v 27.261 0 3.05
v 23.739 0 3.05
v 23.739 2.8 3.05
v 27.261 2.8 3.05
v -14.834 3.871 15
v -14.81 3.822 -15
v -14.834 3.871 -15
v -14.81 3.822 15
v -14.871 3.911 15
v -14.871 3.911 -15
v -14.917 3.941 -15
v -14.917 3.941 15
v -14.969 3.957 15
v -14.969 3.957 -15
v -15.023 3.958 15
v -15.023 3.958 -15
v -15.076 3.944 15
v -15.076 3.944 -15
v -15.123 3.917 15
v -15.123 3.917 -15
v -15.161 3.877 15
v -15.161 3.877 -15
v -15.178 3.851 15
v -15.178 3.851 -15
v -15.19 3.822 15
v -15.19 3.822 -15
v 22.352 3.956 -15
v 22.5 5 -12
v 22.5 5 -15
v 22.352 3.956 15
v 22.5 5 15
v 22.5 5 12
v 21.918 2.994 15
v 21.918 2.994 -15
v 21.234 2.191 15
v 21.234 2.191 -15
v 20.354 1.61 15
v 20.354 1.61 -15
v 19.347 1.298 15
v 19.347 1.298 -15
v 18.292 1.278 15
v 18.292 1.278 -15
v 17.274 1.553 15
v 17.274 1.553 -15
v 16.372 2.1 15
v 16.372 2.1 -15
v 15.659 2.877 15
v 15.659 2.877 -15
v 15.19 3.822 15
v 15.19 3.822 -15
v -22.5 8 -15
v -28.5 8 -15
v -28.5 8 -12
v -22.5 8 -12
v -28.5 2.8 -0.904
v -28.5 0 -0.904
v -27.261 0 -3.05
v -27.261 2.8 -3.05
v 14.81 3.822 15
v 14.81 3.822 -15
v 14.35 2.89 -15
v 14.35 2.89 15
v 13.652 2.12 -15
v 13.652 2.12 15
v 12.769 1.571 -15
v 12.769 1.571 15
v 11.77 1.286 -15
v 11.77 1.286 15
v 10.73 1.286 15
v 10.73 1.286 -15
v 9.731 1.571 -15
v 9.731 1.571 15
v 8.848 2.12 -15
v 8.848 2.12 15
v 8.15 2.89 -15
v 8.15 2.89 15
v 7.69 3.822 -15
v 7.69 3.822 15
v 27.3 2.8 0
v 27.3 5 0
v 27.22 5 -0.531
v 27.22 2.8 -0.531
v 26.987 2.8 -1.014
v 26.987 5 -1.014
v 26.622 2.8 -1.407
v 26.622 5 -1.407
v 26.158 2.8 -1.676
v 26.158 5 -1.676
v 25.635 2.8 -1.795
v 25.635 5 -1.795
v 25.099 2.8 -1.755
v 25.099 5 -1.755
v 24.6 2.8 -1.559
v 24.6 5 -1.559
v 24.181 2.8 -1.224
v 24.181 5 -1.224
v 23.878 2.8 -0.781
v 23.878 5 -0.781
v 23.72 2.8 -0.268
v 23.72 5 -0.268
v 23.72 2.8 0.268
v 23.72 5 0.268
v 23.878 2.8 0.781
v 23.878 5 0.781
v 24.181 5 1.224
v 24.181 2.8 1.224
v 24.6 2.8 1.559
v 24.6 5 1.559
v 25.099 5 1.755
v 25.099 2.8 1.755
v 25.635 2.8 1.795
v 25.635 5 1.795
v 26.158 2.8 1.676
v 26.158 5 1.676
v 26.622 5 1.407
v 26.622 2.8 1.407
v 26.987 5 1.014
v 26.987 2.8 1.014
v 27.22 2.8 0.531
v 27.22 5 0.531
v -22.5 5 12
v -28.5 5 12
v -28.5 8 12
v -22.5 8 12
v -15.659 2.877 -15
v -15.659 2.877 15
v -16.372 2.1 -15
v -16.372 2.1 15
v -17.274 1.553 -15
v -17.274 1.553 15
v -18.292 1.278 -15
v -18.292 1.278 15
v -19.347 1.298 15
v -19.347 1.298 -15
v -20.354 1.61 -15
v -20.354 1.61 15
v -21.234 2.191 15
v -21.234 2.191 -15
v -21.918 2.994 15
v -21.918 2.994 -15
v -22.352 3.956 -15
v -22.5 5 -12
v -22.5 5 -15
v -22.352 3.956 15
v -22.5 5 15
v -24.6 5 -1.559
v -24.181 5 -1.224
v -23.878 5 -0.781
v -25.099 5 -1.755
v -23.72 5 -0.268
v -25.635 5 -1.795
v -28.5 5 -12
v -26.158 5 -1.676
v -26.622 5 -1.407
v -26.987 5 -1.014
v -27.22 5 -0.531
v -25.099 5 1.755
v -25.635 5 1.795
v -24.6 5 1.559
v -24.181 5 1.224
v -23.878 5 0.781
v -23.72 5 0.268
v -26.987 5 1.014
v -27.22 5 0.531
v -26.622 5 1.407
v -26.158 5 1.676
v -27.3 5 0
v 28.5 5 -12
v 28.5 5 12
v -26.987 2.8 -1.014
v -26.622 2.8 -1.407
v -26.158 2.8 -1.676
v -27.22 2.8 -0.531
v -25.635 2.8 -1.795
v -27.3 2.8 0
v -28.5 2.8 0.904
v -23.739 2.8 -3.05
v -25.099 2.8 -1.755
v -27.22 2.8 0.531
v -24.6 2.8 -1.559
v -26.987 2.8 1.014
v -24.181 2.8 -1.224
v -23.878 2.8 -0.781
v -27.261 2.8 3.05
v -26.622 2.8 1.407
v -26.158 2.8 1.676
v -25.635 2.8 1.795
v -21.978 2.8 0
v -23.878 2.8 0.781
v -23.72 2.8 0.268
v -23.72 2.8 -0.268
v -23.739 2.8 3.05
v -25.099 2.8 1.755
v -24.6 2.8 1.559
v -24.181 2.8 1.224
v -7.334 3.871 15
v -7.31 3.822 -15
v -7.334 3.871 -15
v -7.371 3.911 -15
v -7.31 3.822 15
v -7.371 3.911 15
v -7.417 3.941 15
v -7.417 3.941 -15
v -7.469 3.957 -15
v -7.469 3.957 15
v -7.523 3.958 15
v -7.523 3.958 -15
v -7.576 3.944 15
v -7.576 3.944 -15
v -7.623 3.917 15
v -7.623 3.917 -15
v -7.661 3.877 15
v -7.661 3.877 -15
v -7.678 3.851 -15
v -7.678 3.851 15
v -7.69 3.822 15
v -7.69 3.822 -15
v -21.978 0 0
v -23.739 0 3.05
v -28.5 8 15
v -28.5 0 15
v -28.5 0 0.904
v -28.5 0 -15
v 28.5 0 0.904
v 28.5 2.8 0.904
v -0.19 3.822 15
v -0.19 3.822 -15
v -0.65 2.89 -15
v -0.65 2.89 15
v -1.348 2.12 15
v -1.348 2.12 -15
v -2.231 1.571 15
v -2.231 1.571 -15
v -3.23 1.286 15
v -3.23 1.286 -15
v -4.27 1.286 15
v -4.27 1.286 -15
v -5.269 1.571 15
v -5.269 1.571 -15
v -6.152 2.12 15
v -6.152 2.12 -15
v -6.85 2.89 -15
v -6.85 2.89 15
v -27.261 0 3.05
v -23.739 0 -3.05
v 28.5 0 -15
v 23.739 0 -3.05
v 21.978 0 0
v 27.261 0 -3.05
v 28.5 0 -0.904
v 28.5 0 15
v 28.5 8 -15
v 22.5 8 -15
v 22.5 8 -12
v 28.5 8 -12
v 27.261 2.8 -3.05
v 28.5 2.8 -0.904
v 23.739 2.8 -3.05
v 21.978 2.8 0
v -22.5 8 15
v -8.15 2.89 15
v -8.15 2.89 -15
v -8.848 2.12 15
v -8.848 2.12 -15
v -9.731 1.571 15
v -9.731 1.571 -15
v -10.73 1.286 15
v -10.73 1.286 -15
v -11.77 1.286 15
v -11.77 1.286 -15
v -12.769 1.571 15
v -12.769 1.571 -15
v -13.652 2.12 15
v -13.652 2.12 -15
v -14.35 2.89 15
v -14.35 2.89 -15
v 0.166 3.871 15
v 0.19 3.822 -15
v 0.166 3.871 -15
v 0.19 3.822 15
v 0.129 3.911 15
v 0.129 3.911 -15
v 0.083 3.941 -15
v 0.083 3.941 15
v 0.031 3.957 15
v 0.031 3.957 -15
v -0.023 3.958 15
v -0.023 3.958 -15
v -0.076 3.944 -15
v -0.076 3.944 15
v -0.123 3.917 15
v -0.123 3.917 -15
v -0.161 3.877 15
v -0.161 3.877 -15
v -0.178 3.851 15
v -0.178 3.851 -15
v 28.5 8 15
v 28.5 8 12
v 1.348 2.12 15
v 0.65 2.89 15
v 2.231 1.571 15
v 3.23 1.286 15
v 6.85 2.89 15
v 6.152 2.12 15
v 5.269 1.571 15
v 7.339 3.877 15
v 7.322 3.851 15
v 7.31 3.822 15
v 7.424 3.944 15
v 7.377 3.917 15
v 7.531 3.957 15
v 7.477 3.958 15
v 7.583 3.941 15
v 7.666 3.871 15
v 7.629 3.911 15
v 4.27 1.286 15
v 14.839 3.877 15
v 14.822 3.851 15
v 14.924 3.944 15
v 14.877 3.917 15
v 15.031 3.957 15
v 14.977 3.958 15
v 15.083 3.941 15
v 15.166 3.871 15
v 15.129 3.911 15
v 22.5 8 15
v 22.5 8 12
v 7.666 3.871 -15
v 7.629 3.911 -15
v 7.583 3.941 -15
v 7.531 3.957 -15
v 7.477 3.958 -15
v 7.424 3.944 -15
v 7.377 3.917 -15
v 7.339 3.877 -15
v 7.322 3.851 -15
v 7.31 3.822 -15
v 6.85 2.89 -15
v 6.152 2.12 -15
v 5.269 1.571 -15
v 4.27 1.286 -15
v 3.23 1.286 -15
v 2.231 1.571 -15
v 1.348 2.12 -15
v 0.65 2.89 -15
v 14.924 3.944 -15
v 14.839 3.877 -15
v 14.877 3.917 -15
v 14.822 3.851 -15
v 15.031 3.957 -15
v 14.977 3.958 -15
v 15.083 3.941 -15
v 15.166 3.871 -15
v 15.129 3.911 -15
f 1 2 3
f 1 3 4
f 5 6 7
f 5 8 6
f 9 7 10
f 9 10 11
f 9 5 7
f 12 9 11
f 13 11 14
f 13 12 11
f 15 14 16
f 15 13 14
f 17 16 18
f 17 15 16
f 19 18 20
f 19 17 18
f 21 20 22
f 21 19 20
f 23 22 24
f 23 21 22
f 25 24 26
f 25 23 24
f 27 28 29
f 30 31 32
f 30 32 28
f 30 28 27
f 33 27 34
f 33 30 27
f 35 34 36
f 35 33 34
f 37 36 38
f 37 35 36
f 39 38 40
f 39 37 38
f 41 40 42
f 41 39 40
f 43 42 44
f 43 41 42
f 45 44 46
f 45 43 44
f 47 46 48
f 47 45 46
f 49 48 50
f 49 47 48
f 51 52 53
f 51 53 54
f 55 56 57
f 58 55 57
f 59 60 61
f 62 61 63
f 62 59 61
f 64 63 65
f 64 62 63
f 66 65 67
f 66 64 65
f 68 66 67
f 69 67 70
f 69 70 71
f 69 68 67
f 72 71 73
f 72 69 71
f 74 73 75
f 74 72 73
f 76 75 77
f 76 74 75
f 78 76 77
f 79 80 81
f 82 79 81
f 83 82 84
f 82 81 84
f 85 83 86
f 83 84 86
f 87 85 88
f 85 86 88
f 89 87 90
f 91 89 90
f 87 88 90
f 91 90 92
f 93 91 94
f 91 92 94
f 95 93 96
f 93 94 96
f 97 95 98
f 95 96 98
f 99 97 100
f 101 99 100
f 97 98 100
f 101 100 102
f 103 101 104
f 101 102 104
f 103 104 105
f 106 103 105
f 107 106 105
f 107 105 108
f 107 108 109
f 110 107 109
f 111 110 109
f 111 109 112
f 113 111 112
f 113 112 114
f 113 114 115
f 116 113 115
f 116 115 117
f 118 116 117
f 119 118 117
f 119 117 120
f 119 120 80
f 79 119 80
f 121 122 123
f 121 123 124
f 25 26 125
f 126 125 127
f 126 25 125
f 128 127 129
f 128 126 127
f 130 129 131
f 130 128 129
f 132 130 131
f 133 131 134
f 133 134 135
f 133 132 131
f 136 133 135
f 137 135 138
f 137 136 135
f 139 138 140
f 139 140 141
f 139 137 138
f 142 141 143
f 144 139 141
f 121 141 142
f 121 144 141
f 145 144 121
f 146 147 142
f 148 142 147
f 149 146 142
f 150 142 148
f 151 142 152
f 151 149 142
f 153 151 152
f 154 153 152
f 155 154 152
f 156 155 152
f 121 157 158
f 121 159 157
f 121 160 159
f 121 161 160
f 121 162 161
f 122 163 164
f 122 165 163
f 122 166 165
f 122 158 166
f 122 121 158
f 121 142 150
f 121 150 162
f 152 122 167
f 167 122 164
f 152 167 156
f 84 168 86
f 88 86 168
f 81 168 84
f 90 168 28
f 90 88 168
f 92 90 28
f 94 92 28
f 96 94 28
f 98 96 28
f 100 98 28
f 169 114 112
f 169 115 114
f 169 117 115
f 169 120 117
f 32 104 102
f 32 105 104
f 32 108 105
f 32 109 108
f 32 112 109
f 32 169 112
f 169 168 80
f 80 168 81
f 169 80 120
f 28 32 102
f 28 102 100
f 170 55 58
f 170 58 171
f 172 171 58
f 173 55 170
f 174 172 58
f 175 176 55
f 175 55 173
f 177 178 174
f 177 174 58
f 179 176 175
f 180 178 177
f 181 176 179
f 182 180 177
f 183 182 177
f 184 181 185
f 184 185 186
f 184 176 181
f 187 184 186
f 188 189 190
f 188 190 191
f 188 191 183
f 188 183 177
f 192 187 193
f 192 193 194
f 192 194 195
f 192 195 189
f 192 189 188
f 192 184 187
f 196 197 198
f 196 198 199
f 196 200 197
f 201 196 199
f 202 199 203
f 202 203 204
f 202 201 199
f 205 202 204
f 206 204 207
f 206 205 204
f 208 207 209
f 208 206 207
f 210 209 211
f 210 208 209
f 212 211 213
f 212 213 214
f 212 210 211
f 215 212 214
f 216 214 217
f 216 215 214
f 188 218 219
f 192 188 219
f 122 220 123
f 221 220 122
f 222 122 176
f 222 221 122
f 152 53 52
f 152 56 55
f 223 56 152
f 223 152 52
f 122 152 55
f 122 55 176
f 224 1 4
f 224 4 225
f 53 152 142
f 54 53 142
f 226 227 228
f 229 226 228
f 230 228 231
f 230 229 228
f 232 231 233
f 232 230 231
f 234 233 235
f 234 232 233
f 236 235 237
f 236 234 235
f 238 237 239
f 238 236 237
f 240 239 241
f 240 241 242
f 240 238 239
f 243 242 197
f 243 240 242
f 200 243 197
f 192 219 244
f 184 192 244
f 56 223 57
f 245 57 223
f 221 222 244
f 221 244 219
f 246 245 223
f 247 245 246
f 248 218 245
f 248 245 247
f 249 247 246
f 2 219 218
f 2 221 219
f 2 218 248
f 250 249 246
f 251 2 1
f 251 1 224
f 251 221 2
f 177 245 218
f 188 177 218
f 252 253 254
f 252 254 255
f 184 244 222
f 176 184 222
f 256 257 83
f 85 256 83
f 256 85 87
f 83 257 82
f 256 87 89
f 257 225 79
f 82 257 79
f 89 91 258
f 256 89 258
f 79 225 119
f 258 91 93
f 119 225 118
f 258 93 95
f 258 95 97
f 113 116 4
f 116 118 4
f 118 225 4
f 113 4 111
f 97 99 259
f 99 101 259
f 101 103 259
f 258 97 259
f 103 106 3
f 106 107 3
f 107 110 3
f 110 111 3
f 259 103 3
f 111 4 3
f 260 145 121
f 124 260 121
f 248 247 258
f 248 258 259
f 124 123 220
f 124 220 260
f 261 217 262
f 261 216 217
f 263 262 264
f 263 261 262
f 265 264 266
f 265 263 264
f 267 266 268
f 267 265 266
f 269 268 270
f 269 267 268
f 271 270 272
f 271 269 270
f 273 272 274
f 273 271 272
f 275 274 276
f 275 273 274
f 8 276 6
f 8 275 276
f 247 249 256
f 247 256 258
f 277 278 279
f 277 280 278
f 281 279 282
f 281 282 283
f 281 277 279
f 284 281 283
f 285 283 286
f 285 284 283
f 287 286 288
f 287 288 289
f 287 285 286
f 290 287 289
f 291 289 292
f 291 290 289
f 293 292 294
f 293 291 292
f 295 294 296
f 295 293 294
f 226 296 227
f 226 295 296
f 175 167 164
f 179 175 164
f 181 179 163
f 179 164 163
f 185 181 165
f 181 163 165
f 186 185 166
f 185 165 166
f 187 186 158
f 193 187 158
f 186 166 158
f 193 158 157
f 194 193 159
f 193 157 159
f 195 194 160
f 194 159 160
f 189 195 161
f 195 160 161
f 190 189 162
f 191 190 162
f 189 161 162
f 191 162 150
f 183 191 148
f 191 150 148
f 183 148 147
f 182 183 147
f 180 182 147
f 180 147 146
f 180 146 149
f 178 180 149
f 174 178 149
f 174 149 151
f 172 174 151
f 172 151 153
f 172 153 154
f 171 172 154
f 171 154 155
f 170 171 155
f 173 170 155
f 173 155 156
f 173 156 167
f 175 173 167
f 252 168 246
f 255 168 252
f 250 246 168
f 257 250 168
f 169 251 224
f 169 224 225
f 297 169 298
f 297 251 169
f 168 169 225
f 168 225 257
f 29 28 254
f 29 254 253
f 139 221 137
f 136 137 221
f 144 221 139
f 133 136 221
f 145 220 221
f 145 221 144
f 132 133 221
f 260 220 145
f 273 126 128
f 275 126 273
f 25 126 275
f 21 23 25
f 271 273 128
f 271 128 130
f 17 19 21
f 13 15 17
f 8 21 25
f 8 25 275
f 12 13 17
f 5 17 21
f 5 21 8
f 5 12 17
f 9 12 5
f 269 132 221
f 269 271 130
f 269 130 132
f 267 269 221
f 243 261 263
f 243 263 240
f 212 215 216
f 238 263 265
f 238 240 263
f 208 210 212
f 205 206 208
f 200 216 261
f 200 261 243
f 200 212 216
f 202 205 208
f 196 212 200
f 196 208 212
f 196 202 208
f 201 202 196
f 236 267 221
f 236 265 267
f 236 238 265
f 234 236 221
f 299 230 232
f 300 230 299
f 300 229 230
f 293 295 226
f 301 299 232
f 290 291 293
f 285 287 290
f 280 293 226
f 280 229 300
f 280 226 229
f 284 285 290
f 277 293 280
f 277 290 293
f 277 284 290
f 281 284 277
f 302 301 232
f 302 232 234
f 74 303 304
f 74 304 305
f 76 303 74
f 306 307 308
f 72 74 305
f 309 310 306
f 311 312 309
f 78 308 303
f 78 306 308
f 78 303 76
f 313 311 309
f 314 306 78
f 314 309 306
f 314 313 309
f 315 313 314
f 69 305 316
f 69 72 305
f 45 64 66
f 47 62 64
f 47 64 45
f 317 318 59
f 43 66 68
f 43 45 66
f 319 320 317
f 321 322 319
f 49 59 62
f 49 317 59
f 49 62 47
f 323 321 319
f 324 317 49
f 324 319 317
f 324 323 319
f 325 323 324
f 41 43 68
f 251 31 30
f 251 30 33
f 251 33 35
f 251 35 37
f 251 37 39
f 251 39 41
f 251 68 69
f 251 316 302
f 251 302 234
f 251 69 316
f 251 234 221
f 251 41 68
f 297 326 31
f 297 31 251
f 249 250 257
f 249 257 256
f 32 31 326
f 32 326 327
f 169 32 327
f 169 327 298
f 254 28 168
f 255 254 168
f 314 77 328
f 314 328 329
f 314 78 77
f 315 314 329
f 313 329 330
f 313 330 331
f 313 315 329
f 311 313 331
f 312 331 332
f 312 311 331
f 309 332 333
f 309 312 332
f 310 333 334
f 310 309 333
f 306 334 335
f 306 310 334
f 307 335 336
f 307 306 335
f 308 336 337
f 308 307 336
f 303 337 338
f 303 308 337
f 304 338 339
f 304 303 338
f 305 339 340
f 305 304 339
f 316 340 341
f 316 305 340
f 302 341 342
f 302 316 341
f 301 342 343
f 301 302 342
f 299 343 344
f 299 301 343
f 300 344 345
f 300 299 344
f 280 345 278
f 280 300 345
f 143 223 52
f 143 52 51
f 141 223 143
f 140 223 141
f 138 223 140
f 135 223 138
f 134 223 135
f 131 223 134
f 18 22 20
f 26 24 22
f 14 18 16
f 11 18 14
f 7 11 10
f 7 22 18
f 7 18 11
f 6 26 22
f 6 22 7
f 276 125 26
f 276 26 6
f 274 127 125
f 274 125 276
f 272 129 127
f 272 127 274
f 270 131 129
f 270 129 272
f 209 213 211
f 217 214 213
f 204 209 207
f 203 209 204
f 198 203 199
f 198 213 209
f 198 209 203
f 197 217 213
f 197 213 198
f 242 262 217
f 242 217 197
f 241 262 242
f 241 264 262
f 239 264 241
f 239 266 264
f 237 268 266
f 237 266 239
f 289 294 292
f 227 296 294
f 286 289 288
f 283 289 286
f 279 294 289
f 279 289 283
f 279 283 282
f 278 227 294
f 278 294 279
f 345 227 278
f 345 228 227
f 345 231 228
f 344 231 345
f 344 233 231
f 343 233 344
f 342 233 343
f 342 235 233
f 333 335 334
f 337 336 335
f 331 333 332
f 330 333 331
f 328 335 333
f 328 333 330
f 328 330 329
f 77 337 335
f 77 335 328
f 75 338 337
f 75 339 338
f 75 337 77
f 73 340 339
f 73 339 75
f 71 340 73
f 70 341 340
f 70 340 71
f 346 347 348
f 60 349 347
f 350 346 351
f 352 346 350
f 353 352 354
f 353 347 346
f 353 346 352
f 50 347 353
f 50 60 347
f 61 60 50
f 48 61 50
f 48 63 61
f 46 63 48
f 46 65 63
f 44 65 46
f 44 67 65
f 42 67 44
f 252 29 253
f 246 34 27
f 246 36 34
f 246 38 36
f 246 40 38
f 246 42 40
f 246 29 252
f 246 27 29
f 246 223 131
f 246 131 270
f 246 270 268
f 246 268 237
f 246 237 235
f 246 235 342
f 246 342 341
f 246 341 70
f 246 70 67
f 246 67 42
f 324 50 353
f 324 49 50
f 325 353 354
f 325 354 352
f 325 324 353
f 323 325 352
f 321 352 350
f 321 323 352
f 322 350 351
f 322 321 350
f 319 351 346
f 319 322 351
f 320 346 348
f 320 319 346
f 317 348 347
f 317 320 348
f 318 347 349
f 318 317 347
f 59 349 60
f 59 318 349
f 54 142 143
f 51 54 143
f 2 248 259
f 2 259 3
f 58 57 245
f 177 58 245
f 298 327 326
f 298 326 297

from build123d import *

# Parameters (mm, degrees)
RESSALTO_EXTRUS_O1_DEPTH = 15
ESBO_O2_R                = 1.8
CORTE_EXTRUS_O1_DEPTH    = 33.592176975
FILETE1_R                = 0.2
ESBO_O3_W                = 6
ESBO_O3_H                = 3
RESSALTO_EXTRUS_O2_DEPTH = 3
CORTE_EXTRUS_O2_DEPTH    = 2.8


with BuildPart() as part:
    # Esboço1 → Ressalto-extrusão1 (new, symmetric)
    with BuildSketch(Plane.XY):
        with BuildLine():
            Line((-22.5, 0), (22.5, 0))
            Line((22.5, 0), (28.5, 0))
            Line((28.5, 0), (28.5, 5))
            Line((28.5, 5), (22.5, 5))
            ThreePointArc((22.5, 5), (18.75, 1.25), (15, 5))
            ThreePointArc((15, 5), (11.25, 1.25), (7.5, 5))
            ThreePointArc((7.5, 5), (3.75, 1.25), (0, 5))
            ThreePointArc((0, 5), (-3.75, 1.25), (-7.5, 5))
            ThreePointArc((-7.5, 5), (-11.25, 1.25), (-15, 5))
            ThreePointArc((-15, 5), (-18.75, 1.25), (-22.5, 5))
            Line((-22.5, 5), (-28.5, 5))
            Line((-28.5, 5), (-28.5, 0))
            Line((-28.5, 0), (-22.5, 0))
        make_face()
    extrude(amount=RESSALTO_EXTRUS_O1_DEPTH, both=True)

    # Esboço2 → Corte-extrusão1 (cut, through all)
    with BuildSketch(Plane(origin=(0, 5, 0), x_dir=(1, 0, 0), z_dir=(0, 1, 0))):
        with Locations(Location((-25.5, 0, 0), (0, 0, 180))):
            Circle(ESBO_O2_R)
        with Locations((25.5, 0)):
            Circle(ESBO_O2_R)
    extrude(amount=-CORTE_EXTRUS_O1_DEPTH, mode=Mode.SUBTRACT)

    # Filete1
    filete1_edges = [part.edges().sort_by_distance(p)[0] for p in [
        (-15, 5, 0),
        (-7.5, 5, 0),
        (0, 5, 0),
        (7.5, 5, 0),
        (15, 5, 0),
    ]]
    fillet(filete1_edges, radius=FILETE1_R)

    # Esboço3 → Ressalto-extrusão2 (add)
    with BuildSketch(Plane(origin=(0, 5, 0), x_dir=(1, 0, 0), z_dir=(0, 1, 0))):
        with Locations((-25.5, 13.5)):
            Rectangle(ESBO_O3_W, ESBO_O3_H)
        with Locations((-25.5, -13.5)):
            Rectangle(ESBO_O3_W, ESBO_O3_H)
        with Locations((25.5, -13.5)):
            Rectangle(ESBO_O3_W, ESBO_O3_H)
        with Locations((25.5, 13.5)):
            Rectangle(ESBO_O3_W, ESBO_O3_H)
    extrude(amount=RESSALTO_EXTRUS_O2_DEPTH)

    # Esboço4 → Corte-extrusão2 (cut)
    with BuildSketch(Plane.XZ):
        Polygon((-29.021836642, 0), (-27.260918321, -3.05), (-23.739081679, -3.05), (-21.978163358, 0), (-23.739081679, 3.05), (-27.260918321, 3.05), align=None)
        Polygon((27.260918321, 3.05), (29.021836642, 0), (27.260918321, -3.05), (23.739081679, -3.05), (21.978163358, 0), (23.739081679, 3.05), align=None)
    extrude(amount=-CORTE_EXTRUS_O2_DEPTH, mode=Mode.SUBTRACT)


solid = part.part
